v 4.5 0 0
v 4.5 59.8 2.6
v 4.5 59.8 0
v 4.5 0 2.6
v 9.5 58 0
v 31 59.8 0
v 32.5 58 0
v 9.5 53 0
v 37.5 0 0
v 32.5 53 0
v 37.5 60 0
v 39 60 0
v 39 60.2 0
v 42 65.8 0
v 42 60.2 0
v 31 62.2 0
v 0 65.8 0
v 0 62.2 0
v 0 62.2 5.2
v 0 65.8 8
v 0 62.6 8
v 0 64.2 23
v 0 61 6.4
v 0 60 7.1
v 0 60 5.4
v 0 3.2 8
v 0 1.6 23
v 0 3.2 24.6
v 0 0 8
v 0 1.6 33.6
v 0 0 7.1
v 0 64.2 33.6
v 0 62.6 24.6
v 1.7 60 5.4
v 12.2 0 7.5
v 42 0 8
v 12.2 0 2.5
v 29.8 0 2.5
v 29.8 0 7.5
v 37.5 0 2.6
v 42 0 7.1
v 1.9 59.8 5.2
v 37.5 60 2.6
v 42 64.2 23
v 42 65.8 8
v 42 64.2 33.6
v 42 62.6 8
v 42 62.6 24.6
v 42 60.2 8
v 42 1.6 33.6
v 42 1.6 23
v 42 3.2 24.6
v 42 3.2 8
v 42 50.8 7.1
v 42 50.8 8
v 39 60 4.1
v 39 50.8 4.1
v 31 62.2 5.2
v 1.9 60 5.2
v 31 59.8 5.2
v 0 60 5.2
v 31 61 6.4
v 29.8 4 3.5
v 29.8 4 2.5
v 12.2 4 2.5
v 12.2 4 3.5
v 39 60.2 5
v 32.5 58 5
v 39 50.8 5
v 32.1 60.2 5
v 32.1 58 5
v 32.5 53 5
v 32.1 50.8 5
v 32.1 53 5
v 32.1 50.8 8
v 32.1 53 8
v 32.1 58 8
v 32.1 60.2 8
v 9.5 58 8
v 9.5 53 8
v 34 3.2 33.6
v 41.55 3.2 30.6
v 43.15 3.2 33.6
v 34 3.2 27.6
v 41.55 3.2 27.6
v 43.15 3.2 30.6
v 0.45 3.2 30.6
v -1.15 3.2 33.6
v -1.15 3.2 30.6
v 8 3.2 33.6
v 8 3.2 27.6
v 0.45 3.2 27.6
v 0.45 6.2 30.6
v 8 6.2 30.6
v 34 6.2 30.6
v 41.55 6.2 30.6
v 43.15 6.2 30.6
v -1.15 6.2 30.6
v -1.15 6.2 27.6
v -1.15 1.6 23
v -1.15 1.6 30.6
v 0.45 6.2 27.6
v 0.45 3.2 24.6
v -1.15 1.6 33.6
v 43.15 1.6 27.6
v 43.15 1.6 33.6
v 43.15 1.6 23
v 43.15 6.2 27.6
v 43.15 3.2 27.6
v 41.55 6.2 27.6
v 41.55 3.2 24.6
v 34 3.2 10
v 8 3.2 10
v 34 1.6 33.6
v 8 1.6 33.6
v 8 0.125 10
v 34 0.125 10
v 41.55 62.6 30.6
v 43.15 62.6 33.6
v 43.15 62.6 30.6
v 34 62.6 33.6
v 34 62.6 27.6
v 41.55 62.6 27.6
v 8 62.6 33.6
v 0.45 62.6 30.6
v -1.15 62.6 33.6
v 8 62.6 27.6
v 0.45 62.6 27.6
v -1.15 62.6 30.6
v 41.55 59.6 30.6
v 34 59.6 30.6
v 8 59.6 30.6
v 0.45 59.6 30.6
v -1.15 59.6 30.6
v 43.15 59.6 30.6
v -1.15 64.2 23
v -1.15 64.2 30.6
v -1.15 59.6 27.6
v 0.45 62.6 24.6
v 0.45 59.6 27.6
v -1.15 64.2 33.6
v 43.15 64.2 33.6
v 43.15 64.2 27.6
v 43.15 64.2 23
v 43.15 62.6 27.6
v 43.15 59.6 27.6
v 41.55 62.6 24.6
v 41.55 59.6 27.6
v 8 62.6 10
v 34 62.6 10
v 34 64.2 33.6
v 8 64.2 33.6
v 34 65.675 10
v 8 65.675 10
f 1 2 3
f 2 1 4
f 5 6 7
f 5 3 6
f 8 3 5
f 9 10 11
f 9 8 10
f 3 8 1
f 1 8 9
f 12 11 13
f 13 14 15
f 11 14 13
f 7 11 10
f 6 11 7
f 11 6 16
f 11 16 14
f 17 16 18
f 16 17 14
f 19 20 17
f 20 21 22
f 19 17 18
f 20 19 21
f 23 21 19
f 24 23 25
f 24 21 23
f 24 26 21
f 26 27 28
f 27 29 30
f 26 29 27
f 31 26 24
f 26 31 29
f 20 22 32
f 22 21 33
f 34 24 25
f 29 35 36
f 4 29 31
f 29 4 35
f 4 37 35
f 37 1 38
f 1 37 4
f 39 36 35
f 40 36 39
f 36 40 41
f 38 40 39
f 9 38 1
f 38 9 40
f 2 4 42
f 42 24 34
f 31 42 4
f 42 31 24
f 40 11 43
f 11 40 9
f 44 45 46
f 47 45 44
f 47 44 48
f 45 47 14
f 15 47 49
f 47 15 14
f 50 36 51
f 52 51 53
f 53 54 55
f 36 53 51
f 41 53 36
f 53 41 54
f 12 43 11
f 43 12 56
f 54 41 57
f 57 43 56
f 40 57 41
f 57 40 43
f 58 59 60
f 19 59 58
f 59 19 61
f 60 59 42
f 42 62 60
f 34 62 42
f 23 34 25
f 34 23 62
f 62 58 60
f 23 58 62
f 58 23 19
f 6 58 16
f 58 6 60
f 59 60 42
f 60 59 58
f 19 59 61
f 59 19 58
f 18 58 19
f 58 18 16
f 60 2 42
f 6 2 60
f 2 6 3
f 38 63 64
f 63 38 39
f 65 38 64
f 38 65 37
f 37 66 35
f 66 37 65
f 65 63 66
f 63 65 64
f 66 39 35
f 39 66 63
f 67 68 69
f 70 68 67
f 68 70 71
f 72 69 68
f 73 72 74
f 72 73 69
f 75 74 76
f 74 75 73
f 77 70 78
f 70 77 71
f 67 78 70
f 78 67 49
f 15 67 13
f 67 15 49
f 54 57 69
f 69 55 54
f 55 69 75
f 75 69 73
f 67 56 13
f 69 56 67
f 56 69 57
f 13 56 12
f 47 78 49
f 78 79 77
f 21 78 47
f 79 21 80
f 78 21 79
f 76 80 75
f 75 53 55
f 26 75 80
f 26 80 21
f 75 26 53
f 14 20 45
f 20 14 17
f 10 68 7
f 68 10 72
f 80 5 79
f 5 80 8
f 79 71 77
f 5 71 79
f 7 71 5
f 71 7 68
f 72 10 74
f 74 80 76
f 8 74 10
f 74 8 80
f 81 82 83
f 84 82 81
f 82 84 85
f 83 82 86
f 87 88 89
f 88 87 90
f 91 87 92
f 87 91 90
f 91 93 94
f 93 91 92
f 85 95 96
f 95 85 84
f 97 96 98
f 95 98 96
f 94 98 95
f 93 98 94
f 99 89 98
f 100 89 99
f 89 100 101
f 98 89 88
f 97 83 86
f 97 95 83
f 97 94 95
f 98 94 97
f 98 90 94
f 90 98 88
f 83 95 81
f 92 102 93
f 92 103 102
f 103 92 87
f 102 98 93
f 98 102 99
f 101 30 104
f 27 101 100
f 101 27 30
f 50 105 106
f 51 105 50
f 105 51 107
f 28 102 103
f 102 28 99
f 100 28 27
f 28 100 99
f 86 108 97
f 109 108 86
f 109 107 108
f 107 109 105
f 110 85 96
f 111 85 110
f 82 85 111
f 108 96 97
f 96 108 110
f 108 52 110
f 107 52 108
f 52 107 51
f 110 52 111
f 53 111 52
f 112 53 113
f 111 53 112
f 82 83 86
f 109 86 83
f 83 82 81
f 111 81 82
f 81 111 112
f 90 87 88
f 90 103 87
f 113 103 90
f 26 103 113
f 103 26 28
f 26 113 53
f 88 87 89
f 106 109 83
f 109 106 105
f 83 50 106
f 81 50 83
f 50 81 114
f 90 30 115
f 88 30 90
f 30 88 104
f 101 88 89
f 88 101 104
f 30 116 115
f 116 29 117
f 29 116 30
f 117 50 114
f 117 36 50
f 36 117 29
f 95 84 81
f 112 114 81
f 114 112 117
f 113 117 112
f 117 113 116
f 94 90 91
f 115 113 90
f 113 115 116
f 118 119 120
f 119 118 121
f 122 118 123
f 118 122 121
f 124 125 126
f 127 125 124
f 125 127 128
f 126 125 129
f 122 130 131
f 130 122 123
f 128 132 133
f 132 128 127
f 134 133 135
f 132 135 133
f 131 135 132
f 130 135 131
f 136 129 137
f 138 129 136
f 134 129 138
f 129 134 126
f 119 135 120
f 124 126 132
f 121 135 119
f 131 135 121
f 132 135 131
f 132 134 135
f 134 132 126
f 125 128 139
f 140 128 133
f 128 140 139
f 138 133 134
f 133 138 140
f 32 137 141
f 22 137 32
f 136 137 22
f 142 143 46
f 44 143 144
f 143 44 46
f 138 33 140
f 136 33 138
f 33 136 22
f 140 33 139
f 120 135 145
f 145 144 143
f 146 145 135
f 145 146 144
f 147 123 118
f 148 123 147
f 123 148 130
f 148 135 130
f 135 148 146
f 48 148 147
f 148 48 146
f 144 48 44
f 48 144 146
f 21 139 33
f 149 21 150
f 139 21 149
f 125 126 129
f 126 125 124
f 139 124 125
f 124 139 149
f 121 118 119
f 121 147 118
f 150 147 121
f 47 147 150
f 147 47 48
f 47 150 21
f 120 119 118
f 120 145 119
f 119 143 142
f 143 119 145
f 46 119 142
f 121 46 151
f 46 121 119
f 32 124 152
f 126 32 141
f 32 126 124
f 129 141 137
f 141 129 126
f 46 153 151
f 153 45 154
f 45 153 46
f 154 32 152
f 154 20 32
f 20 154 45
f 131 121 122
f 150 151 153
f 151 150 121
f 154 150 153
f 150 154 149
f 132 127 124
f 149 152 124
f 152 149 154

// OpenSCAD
/*
Generic Action Camera Adapter for 3DR Solo
Copyright (C) 2016 - 2017  Hugh Eaves

This program is free software: you can redistribute it and/or modify
it under the terms of the GNU General Public License as published by
the Free Software Foundation, either version 3 of the License, or
(at your option) any later version.

This program is distributed in the hope that it will be useful,
but WITHOUT ANY WARRANTY; without even the implied warranty of
MERCHANTABILITY or FITNESS FOR A PARTICULAR PURPOSE.  See the
GNU General Public License for more details.

You should have received a copy of the GNU General Public License
along with this program.  If not, see <http://www.gnu.org/licenses/>.
*/

use <main.scad>

adapter();
